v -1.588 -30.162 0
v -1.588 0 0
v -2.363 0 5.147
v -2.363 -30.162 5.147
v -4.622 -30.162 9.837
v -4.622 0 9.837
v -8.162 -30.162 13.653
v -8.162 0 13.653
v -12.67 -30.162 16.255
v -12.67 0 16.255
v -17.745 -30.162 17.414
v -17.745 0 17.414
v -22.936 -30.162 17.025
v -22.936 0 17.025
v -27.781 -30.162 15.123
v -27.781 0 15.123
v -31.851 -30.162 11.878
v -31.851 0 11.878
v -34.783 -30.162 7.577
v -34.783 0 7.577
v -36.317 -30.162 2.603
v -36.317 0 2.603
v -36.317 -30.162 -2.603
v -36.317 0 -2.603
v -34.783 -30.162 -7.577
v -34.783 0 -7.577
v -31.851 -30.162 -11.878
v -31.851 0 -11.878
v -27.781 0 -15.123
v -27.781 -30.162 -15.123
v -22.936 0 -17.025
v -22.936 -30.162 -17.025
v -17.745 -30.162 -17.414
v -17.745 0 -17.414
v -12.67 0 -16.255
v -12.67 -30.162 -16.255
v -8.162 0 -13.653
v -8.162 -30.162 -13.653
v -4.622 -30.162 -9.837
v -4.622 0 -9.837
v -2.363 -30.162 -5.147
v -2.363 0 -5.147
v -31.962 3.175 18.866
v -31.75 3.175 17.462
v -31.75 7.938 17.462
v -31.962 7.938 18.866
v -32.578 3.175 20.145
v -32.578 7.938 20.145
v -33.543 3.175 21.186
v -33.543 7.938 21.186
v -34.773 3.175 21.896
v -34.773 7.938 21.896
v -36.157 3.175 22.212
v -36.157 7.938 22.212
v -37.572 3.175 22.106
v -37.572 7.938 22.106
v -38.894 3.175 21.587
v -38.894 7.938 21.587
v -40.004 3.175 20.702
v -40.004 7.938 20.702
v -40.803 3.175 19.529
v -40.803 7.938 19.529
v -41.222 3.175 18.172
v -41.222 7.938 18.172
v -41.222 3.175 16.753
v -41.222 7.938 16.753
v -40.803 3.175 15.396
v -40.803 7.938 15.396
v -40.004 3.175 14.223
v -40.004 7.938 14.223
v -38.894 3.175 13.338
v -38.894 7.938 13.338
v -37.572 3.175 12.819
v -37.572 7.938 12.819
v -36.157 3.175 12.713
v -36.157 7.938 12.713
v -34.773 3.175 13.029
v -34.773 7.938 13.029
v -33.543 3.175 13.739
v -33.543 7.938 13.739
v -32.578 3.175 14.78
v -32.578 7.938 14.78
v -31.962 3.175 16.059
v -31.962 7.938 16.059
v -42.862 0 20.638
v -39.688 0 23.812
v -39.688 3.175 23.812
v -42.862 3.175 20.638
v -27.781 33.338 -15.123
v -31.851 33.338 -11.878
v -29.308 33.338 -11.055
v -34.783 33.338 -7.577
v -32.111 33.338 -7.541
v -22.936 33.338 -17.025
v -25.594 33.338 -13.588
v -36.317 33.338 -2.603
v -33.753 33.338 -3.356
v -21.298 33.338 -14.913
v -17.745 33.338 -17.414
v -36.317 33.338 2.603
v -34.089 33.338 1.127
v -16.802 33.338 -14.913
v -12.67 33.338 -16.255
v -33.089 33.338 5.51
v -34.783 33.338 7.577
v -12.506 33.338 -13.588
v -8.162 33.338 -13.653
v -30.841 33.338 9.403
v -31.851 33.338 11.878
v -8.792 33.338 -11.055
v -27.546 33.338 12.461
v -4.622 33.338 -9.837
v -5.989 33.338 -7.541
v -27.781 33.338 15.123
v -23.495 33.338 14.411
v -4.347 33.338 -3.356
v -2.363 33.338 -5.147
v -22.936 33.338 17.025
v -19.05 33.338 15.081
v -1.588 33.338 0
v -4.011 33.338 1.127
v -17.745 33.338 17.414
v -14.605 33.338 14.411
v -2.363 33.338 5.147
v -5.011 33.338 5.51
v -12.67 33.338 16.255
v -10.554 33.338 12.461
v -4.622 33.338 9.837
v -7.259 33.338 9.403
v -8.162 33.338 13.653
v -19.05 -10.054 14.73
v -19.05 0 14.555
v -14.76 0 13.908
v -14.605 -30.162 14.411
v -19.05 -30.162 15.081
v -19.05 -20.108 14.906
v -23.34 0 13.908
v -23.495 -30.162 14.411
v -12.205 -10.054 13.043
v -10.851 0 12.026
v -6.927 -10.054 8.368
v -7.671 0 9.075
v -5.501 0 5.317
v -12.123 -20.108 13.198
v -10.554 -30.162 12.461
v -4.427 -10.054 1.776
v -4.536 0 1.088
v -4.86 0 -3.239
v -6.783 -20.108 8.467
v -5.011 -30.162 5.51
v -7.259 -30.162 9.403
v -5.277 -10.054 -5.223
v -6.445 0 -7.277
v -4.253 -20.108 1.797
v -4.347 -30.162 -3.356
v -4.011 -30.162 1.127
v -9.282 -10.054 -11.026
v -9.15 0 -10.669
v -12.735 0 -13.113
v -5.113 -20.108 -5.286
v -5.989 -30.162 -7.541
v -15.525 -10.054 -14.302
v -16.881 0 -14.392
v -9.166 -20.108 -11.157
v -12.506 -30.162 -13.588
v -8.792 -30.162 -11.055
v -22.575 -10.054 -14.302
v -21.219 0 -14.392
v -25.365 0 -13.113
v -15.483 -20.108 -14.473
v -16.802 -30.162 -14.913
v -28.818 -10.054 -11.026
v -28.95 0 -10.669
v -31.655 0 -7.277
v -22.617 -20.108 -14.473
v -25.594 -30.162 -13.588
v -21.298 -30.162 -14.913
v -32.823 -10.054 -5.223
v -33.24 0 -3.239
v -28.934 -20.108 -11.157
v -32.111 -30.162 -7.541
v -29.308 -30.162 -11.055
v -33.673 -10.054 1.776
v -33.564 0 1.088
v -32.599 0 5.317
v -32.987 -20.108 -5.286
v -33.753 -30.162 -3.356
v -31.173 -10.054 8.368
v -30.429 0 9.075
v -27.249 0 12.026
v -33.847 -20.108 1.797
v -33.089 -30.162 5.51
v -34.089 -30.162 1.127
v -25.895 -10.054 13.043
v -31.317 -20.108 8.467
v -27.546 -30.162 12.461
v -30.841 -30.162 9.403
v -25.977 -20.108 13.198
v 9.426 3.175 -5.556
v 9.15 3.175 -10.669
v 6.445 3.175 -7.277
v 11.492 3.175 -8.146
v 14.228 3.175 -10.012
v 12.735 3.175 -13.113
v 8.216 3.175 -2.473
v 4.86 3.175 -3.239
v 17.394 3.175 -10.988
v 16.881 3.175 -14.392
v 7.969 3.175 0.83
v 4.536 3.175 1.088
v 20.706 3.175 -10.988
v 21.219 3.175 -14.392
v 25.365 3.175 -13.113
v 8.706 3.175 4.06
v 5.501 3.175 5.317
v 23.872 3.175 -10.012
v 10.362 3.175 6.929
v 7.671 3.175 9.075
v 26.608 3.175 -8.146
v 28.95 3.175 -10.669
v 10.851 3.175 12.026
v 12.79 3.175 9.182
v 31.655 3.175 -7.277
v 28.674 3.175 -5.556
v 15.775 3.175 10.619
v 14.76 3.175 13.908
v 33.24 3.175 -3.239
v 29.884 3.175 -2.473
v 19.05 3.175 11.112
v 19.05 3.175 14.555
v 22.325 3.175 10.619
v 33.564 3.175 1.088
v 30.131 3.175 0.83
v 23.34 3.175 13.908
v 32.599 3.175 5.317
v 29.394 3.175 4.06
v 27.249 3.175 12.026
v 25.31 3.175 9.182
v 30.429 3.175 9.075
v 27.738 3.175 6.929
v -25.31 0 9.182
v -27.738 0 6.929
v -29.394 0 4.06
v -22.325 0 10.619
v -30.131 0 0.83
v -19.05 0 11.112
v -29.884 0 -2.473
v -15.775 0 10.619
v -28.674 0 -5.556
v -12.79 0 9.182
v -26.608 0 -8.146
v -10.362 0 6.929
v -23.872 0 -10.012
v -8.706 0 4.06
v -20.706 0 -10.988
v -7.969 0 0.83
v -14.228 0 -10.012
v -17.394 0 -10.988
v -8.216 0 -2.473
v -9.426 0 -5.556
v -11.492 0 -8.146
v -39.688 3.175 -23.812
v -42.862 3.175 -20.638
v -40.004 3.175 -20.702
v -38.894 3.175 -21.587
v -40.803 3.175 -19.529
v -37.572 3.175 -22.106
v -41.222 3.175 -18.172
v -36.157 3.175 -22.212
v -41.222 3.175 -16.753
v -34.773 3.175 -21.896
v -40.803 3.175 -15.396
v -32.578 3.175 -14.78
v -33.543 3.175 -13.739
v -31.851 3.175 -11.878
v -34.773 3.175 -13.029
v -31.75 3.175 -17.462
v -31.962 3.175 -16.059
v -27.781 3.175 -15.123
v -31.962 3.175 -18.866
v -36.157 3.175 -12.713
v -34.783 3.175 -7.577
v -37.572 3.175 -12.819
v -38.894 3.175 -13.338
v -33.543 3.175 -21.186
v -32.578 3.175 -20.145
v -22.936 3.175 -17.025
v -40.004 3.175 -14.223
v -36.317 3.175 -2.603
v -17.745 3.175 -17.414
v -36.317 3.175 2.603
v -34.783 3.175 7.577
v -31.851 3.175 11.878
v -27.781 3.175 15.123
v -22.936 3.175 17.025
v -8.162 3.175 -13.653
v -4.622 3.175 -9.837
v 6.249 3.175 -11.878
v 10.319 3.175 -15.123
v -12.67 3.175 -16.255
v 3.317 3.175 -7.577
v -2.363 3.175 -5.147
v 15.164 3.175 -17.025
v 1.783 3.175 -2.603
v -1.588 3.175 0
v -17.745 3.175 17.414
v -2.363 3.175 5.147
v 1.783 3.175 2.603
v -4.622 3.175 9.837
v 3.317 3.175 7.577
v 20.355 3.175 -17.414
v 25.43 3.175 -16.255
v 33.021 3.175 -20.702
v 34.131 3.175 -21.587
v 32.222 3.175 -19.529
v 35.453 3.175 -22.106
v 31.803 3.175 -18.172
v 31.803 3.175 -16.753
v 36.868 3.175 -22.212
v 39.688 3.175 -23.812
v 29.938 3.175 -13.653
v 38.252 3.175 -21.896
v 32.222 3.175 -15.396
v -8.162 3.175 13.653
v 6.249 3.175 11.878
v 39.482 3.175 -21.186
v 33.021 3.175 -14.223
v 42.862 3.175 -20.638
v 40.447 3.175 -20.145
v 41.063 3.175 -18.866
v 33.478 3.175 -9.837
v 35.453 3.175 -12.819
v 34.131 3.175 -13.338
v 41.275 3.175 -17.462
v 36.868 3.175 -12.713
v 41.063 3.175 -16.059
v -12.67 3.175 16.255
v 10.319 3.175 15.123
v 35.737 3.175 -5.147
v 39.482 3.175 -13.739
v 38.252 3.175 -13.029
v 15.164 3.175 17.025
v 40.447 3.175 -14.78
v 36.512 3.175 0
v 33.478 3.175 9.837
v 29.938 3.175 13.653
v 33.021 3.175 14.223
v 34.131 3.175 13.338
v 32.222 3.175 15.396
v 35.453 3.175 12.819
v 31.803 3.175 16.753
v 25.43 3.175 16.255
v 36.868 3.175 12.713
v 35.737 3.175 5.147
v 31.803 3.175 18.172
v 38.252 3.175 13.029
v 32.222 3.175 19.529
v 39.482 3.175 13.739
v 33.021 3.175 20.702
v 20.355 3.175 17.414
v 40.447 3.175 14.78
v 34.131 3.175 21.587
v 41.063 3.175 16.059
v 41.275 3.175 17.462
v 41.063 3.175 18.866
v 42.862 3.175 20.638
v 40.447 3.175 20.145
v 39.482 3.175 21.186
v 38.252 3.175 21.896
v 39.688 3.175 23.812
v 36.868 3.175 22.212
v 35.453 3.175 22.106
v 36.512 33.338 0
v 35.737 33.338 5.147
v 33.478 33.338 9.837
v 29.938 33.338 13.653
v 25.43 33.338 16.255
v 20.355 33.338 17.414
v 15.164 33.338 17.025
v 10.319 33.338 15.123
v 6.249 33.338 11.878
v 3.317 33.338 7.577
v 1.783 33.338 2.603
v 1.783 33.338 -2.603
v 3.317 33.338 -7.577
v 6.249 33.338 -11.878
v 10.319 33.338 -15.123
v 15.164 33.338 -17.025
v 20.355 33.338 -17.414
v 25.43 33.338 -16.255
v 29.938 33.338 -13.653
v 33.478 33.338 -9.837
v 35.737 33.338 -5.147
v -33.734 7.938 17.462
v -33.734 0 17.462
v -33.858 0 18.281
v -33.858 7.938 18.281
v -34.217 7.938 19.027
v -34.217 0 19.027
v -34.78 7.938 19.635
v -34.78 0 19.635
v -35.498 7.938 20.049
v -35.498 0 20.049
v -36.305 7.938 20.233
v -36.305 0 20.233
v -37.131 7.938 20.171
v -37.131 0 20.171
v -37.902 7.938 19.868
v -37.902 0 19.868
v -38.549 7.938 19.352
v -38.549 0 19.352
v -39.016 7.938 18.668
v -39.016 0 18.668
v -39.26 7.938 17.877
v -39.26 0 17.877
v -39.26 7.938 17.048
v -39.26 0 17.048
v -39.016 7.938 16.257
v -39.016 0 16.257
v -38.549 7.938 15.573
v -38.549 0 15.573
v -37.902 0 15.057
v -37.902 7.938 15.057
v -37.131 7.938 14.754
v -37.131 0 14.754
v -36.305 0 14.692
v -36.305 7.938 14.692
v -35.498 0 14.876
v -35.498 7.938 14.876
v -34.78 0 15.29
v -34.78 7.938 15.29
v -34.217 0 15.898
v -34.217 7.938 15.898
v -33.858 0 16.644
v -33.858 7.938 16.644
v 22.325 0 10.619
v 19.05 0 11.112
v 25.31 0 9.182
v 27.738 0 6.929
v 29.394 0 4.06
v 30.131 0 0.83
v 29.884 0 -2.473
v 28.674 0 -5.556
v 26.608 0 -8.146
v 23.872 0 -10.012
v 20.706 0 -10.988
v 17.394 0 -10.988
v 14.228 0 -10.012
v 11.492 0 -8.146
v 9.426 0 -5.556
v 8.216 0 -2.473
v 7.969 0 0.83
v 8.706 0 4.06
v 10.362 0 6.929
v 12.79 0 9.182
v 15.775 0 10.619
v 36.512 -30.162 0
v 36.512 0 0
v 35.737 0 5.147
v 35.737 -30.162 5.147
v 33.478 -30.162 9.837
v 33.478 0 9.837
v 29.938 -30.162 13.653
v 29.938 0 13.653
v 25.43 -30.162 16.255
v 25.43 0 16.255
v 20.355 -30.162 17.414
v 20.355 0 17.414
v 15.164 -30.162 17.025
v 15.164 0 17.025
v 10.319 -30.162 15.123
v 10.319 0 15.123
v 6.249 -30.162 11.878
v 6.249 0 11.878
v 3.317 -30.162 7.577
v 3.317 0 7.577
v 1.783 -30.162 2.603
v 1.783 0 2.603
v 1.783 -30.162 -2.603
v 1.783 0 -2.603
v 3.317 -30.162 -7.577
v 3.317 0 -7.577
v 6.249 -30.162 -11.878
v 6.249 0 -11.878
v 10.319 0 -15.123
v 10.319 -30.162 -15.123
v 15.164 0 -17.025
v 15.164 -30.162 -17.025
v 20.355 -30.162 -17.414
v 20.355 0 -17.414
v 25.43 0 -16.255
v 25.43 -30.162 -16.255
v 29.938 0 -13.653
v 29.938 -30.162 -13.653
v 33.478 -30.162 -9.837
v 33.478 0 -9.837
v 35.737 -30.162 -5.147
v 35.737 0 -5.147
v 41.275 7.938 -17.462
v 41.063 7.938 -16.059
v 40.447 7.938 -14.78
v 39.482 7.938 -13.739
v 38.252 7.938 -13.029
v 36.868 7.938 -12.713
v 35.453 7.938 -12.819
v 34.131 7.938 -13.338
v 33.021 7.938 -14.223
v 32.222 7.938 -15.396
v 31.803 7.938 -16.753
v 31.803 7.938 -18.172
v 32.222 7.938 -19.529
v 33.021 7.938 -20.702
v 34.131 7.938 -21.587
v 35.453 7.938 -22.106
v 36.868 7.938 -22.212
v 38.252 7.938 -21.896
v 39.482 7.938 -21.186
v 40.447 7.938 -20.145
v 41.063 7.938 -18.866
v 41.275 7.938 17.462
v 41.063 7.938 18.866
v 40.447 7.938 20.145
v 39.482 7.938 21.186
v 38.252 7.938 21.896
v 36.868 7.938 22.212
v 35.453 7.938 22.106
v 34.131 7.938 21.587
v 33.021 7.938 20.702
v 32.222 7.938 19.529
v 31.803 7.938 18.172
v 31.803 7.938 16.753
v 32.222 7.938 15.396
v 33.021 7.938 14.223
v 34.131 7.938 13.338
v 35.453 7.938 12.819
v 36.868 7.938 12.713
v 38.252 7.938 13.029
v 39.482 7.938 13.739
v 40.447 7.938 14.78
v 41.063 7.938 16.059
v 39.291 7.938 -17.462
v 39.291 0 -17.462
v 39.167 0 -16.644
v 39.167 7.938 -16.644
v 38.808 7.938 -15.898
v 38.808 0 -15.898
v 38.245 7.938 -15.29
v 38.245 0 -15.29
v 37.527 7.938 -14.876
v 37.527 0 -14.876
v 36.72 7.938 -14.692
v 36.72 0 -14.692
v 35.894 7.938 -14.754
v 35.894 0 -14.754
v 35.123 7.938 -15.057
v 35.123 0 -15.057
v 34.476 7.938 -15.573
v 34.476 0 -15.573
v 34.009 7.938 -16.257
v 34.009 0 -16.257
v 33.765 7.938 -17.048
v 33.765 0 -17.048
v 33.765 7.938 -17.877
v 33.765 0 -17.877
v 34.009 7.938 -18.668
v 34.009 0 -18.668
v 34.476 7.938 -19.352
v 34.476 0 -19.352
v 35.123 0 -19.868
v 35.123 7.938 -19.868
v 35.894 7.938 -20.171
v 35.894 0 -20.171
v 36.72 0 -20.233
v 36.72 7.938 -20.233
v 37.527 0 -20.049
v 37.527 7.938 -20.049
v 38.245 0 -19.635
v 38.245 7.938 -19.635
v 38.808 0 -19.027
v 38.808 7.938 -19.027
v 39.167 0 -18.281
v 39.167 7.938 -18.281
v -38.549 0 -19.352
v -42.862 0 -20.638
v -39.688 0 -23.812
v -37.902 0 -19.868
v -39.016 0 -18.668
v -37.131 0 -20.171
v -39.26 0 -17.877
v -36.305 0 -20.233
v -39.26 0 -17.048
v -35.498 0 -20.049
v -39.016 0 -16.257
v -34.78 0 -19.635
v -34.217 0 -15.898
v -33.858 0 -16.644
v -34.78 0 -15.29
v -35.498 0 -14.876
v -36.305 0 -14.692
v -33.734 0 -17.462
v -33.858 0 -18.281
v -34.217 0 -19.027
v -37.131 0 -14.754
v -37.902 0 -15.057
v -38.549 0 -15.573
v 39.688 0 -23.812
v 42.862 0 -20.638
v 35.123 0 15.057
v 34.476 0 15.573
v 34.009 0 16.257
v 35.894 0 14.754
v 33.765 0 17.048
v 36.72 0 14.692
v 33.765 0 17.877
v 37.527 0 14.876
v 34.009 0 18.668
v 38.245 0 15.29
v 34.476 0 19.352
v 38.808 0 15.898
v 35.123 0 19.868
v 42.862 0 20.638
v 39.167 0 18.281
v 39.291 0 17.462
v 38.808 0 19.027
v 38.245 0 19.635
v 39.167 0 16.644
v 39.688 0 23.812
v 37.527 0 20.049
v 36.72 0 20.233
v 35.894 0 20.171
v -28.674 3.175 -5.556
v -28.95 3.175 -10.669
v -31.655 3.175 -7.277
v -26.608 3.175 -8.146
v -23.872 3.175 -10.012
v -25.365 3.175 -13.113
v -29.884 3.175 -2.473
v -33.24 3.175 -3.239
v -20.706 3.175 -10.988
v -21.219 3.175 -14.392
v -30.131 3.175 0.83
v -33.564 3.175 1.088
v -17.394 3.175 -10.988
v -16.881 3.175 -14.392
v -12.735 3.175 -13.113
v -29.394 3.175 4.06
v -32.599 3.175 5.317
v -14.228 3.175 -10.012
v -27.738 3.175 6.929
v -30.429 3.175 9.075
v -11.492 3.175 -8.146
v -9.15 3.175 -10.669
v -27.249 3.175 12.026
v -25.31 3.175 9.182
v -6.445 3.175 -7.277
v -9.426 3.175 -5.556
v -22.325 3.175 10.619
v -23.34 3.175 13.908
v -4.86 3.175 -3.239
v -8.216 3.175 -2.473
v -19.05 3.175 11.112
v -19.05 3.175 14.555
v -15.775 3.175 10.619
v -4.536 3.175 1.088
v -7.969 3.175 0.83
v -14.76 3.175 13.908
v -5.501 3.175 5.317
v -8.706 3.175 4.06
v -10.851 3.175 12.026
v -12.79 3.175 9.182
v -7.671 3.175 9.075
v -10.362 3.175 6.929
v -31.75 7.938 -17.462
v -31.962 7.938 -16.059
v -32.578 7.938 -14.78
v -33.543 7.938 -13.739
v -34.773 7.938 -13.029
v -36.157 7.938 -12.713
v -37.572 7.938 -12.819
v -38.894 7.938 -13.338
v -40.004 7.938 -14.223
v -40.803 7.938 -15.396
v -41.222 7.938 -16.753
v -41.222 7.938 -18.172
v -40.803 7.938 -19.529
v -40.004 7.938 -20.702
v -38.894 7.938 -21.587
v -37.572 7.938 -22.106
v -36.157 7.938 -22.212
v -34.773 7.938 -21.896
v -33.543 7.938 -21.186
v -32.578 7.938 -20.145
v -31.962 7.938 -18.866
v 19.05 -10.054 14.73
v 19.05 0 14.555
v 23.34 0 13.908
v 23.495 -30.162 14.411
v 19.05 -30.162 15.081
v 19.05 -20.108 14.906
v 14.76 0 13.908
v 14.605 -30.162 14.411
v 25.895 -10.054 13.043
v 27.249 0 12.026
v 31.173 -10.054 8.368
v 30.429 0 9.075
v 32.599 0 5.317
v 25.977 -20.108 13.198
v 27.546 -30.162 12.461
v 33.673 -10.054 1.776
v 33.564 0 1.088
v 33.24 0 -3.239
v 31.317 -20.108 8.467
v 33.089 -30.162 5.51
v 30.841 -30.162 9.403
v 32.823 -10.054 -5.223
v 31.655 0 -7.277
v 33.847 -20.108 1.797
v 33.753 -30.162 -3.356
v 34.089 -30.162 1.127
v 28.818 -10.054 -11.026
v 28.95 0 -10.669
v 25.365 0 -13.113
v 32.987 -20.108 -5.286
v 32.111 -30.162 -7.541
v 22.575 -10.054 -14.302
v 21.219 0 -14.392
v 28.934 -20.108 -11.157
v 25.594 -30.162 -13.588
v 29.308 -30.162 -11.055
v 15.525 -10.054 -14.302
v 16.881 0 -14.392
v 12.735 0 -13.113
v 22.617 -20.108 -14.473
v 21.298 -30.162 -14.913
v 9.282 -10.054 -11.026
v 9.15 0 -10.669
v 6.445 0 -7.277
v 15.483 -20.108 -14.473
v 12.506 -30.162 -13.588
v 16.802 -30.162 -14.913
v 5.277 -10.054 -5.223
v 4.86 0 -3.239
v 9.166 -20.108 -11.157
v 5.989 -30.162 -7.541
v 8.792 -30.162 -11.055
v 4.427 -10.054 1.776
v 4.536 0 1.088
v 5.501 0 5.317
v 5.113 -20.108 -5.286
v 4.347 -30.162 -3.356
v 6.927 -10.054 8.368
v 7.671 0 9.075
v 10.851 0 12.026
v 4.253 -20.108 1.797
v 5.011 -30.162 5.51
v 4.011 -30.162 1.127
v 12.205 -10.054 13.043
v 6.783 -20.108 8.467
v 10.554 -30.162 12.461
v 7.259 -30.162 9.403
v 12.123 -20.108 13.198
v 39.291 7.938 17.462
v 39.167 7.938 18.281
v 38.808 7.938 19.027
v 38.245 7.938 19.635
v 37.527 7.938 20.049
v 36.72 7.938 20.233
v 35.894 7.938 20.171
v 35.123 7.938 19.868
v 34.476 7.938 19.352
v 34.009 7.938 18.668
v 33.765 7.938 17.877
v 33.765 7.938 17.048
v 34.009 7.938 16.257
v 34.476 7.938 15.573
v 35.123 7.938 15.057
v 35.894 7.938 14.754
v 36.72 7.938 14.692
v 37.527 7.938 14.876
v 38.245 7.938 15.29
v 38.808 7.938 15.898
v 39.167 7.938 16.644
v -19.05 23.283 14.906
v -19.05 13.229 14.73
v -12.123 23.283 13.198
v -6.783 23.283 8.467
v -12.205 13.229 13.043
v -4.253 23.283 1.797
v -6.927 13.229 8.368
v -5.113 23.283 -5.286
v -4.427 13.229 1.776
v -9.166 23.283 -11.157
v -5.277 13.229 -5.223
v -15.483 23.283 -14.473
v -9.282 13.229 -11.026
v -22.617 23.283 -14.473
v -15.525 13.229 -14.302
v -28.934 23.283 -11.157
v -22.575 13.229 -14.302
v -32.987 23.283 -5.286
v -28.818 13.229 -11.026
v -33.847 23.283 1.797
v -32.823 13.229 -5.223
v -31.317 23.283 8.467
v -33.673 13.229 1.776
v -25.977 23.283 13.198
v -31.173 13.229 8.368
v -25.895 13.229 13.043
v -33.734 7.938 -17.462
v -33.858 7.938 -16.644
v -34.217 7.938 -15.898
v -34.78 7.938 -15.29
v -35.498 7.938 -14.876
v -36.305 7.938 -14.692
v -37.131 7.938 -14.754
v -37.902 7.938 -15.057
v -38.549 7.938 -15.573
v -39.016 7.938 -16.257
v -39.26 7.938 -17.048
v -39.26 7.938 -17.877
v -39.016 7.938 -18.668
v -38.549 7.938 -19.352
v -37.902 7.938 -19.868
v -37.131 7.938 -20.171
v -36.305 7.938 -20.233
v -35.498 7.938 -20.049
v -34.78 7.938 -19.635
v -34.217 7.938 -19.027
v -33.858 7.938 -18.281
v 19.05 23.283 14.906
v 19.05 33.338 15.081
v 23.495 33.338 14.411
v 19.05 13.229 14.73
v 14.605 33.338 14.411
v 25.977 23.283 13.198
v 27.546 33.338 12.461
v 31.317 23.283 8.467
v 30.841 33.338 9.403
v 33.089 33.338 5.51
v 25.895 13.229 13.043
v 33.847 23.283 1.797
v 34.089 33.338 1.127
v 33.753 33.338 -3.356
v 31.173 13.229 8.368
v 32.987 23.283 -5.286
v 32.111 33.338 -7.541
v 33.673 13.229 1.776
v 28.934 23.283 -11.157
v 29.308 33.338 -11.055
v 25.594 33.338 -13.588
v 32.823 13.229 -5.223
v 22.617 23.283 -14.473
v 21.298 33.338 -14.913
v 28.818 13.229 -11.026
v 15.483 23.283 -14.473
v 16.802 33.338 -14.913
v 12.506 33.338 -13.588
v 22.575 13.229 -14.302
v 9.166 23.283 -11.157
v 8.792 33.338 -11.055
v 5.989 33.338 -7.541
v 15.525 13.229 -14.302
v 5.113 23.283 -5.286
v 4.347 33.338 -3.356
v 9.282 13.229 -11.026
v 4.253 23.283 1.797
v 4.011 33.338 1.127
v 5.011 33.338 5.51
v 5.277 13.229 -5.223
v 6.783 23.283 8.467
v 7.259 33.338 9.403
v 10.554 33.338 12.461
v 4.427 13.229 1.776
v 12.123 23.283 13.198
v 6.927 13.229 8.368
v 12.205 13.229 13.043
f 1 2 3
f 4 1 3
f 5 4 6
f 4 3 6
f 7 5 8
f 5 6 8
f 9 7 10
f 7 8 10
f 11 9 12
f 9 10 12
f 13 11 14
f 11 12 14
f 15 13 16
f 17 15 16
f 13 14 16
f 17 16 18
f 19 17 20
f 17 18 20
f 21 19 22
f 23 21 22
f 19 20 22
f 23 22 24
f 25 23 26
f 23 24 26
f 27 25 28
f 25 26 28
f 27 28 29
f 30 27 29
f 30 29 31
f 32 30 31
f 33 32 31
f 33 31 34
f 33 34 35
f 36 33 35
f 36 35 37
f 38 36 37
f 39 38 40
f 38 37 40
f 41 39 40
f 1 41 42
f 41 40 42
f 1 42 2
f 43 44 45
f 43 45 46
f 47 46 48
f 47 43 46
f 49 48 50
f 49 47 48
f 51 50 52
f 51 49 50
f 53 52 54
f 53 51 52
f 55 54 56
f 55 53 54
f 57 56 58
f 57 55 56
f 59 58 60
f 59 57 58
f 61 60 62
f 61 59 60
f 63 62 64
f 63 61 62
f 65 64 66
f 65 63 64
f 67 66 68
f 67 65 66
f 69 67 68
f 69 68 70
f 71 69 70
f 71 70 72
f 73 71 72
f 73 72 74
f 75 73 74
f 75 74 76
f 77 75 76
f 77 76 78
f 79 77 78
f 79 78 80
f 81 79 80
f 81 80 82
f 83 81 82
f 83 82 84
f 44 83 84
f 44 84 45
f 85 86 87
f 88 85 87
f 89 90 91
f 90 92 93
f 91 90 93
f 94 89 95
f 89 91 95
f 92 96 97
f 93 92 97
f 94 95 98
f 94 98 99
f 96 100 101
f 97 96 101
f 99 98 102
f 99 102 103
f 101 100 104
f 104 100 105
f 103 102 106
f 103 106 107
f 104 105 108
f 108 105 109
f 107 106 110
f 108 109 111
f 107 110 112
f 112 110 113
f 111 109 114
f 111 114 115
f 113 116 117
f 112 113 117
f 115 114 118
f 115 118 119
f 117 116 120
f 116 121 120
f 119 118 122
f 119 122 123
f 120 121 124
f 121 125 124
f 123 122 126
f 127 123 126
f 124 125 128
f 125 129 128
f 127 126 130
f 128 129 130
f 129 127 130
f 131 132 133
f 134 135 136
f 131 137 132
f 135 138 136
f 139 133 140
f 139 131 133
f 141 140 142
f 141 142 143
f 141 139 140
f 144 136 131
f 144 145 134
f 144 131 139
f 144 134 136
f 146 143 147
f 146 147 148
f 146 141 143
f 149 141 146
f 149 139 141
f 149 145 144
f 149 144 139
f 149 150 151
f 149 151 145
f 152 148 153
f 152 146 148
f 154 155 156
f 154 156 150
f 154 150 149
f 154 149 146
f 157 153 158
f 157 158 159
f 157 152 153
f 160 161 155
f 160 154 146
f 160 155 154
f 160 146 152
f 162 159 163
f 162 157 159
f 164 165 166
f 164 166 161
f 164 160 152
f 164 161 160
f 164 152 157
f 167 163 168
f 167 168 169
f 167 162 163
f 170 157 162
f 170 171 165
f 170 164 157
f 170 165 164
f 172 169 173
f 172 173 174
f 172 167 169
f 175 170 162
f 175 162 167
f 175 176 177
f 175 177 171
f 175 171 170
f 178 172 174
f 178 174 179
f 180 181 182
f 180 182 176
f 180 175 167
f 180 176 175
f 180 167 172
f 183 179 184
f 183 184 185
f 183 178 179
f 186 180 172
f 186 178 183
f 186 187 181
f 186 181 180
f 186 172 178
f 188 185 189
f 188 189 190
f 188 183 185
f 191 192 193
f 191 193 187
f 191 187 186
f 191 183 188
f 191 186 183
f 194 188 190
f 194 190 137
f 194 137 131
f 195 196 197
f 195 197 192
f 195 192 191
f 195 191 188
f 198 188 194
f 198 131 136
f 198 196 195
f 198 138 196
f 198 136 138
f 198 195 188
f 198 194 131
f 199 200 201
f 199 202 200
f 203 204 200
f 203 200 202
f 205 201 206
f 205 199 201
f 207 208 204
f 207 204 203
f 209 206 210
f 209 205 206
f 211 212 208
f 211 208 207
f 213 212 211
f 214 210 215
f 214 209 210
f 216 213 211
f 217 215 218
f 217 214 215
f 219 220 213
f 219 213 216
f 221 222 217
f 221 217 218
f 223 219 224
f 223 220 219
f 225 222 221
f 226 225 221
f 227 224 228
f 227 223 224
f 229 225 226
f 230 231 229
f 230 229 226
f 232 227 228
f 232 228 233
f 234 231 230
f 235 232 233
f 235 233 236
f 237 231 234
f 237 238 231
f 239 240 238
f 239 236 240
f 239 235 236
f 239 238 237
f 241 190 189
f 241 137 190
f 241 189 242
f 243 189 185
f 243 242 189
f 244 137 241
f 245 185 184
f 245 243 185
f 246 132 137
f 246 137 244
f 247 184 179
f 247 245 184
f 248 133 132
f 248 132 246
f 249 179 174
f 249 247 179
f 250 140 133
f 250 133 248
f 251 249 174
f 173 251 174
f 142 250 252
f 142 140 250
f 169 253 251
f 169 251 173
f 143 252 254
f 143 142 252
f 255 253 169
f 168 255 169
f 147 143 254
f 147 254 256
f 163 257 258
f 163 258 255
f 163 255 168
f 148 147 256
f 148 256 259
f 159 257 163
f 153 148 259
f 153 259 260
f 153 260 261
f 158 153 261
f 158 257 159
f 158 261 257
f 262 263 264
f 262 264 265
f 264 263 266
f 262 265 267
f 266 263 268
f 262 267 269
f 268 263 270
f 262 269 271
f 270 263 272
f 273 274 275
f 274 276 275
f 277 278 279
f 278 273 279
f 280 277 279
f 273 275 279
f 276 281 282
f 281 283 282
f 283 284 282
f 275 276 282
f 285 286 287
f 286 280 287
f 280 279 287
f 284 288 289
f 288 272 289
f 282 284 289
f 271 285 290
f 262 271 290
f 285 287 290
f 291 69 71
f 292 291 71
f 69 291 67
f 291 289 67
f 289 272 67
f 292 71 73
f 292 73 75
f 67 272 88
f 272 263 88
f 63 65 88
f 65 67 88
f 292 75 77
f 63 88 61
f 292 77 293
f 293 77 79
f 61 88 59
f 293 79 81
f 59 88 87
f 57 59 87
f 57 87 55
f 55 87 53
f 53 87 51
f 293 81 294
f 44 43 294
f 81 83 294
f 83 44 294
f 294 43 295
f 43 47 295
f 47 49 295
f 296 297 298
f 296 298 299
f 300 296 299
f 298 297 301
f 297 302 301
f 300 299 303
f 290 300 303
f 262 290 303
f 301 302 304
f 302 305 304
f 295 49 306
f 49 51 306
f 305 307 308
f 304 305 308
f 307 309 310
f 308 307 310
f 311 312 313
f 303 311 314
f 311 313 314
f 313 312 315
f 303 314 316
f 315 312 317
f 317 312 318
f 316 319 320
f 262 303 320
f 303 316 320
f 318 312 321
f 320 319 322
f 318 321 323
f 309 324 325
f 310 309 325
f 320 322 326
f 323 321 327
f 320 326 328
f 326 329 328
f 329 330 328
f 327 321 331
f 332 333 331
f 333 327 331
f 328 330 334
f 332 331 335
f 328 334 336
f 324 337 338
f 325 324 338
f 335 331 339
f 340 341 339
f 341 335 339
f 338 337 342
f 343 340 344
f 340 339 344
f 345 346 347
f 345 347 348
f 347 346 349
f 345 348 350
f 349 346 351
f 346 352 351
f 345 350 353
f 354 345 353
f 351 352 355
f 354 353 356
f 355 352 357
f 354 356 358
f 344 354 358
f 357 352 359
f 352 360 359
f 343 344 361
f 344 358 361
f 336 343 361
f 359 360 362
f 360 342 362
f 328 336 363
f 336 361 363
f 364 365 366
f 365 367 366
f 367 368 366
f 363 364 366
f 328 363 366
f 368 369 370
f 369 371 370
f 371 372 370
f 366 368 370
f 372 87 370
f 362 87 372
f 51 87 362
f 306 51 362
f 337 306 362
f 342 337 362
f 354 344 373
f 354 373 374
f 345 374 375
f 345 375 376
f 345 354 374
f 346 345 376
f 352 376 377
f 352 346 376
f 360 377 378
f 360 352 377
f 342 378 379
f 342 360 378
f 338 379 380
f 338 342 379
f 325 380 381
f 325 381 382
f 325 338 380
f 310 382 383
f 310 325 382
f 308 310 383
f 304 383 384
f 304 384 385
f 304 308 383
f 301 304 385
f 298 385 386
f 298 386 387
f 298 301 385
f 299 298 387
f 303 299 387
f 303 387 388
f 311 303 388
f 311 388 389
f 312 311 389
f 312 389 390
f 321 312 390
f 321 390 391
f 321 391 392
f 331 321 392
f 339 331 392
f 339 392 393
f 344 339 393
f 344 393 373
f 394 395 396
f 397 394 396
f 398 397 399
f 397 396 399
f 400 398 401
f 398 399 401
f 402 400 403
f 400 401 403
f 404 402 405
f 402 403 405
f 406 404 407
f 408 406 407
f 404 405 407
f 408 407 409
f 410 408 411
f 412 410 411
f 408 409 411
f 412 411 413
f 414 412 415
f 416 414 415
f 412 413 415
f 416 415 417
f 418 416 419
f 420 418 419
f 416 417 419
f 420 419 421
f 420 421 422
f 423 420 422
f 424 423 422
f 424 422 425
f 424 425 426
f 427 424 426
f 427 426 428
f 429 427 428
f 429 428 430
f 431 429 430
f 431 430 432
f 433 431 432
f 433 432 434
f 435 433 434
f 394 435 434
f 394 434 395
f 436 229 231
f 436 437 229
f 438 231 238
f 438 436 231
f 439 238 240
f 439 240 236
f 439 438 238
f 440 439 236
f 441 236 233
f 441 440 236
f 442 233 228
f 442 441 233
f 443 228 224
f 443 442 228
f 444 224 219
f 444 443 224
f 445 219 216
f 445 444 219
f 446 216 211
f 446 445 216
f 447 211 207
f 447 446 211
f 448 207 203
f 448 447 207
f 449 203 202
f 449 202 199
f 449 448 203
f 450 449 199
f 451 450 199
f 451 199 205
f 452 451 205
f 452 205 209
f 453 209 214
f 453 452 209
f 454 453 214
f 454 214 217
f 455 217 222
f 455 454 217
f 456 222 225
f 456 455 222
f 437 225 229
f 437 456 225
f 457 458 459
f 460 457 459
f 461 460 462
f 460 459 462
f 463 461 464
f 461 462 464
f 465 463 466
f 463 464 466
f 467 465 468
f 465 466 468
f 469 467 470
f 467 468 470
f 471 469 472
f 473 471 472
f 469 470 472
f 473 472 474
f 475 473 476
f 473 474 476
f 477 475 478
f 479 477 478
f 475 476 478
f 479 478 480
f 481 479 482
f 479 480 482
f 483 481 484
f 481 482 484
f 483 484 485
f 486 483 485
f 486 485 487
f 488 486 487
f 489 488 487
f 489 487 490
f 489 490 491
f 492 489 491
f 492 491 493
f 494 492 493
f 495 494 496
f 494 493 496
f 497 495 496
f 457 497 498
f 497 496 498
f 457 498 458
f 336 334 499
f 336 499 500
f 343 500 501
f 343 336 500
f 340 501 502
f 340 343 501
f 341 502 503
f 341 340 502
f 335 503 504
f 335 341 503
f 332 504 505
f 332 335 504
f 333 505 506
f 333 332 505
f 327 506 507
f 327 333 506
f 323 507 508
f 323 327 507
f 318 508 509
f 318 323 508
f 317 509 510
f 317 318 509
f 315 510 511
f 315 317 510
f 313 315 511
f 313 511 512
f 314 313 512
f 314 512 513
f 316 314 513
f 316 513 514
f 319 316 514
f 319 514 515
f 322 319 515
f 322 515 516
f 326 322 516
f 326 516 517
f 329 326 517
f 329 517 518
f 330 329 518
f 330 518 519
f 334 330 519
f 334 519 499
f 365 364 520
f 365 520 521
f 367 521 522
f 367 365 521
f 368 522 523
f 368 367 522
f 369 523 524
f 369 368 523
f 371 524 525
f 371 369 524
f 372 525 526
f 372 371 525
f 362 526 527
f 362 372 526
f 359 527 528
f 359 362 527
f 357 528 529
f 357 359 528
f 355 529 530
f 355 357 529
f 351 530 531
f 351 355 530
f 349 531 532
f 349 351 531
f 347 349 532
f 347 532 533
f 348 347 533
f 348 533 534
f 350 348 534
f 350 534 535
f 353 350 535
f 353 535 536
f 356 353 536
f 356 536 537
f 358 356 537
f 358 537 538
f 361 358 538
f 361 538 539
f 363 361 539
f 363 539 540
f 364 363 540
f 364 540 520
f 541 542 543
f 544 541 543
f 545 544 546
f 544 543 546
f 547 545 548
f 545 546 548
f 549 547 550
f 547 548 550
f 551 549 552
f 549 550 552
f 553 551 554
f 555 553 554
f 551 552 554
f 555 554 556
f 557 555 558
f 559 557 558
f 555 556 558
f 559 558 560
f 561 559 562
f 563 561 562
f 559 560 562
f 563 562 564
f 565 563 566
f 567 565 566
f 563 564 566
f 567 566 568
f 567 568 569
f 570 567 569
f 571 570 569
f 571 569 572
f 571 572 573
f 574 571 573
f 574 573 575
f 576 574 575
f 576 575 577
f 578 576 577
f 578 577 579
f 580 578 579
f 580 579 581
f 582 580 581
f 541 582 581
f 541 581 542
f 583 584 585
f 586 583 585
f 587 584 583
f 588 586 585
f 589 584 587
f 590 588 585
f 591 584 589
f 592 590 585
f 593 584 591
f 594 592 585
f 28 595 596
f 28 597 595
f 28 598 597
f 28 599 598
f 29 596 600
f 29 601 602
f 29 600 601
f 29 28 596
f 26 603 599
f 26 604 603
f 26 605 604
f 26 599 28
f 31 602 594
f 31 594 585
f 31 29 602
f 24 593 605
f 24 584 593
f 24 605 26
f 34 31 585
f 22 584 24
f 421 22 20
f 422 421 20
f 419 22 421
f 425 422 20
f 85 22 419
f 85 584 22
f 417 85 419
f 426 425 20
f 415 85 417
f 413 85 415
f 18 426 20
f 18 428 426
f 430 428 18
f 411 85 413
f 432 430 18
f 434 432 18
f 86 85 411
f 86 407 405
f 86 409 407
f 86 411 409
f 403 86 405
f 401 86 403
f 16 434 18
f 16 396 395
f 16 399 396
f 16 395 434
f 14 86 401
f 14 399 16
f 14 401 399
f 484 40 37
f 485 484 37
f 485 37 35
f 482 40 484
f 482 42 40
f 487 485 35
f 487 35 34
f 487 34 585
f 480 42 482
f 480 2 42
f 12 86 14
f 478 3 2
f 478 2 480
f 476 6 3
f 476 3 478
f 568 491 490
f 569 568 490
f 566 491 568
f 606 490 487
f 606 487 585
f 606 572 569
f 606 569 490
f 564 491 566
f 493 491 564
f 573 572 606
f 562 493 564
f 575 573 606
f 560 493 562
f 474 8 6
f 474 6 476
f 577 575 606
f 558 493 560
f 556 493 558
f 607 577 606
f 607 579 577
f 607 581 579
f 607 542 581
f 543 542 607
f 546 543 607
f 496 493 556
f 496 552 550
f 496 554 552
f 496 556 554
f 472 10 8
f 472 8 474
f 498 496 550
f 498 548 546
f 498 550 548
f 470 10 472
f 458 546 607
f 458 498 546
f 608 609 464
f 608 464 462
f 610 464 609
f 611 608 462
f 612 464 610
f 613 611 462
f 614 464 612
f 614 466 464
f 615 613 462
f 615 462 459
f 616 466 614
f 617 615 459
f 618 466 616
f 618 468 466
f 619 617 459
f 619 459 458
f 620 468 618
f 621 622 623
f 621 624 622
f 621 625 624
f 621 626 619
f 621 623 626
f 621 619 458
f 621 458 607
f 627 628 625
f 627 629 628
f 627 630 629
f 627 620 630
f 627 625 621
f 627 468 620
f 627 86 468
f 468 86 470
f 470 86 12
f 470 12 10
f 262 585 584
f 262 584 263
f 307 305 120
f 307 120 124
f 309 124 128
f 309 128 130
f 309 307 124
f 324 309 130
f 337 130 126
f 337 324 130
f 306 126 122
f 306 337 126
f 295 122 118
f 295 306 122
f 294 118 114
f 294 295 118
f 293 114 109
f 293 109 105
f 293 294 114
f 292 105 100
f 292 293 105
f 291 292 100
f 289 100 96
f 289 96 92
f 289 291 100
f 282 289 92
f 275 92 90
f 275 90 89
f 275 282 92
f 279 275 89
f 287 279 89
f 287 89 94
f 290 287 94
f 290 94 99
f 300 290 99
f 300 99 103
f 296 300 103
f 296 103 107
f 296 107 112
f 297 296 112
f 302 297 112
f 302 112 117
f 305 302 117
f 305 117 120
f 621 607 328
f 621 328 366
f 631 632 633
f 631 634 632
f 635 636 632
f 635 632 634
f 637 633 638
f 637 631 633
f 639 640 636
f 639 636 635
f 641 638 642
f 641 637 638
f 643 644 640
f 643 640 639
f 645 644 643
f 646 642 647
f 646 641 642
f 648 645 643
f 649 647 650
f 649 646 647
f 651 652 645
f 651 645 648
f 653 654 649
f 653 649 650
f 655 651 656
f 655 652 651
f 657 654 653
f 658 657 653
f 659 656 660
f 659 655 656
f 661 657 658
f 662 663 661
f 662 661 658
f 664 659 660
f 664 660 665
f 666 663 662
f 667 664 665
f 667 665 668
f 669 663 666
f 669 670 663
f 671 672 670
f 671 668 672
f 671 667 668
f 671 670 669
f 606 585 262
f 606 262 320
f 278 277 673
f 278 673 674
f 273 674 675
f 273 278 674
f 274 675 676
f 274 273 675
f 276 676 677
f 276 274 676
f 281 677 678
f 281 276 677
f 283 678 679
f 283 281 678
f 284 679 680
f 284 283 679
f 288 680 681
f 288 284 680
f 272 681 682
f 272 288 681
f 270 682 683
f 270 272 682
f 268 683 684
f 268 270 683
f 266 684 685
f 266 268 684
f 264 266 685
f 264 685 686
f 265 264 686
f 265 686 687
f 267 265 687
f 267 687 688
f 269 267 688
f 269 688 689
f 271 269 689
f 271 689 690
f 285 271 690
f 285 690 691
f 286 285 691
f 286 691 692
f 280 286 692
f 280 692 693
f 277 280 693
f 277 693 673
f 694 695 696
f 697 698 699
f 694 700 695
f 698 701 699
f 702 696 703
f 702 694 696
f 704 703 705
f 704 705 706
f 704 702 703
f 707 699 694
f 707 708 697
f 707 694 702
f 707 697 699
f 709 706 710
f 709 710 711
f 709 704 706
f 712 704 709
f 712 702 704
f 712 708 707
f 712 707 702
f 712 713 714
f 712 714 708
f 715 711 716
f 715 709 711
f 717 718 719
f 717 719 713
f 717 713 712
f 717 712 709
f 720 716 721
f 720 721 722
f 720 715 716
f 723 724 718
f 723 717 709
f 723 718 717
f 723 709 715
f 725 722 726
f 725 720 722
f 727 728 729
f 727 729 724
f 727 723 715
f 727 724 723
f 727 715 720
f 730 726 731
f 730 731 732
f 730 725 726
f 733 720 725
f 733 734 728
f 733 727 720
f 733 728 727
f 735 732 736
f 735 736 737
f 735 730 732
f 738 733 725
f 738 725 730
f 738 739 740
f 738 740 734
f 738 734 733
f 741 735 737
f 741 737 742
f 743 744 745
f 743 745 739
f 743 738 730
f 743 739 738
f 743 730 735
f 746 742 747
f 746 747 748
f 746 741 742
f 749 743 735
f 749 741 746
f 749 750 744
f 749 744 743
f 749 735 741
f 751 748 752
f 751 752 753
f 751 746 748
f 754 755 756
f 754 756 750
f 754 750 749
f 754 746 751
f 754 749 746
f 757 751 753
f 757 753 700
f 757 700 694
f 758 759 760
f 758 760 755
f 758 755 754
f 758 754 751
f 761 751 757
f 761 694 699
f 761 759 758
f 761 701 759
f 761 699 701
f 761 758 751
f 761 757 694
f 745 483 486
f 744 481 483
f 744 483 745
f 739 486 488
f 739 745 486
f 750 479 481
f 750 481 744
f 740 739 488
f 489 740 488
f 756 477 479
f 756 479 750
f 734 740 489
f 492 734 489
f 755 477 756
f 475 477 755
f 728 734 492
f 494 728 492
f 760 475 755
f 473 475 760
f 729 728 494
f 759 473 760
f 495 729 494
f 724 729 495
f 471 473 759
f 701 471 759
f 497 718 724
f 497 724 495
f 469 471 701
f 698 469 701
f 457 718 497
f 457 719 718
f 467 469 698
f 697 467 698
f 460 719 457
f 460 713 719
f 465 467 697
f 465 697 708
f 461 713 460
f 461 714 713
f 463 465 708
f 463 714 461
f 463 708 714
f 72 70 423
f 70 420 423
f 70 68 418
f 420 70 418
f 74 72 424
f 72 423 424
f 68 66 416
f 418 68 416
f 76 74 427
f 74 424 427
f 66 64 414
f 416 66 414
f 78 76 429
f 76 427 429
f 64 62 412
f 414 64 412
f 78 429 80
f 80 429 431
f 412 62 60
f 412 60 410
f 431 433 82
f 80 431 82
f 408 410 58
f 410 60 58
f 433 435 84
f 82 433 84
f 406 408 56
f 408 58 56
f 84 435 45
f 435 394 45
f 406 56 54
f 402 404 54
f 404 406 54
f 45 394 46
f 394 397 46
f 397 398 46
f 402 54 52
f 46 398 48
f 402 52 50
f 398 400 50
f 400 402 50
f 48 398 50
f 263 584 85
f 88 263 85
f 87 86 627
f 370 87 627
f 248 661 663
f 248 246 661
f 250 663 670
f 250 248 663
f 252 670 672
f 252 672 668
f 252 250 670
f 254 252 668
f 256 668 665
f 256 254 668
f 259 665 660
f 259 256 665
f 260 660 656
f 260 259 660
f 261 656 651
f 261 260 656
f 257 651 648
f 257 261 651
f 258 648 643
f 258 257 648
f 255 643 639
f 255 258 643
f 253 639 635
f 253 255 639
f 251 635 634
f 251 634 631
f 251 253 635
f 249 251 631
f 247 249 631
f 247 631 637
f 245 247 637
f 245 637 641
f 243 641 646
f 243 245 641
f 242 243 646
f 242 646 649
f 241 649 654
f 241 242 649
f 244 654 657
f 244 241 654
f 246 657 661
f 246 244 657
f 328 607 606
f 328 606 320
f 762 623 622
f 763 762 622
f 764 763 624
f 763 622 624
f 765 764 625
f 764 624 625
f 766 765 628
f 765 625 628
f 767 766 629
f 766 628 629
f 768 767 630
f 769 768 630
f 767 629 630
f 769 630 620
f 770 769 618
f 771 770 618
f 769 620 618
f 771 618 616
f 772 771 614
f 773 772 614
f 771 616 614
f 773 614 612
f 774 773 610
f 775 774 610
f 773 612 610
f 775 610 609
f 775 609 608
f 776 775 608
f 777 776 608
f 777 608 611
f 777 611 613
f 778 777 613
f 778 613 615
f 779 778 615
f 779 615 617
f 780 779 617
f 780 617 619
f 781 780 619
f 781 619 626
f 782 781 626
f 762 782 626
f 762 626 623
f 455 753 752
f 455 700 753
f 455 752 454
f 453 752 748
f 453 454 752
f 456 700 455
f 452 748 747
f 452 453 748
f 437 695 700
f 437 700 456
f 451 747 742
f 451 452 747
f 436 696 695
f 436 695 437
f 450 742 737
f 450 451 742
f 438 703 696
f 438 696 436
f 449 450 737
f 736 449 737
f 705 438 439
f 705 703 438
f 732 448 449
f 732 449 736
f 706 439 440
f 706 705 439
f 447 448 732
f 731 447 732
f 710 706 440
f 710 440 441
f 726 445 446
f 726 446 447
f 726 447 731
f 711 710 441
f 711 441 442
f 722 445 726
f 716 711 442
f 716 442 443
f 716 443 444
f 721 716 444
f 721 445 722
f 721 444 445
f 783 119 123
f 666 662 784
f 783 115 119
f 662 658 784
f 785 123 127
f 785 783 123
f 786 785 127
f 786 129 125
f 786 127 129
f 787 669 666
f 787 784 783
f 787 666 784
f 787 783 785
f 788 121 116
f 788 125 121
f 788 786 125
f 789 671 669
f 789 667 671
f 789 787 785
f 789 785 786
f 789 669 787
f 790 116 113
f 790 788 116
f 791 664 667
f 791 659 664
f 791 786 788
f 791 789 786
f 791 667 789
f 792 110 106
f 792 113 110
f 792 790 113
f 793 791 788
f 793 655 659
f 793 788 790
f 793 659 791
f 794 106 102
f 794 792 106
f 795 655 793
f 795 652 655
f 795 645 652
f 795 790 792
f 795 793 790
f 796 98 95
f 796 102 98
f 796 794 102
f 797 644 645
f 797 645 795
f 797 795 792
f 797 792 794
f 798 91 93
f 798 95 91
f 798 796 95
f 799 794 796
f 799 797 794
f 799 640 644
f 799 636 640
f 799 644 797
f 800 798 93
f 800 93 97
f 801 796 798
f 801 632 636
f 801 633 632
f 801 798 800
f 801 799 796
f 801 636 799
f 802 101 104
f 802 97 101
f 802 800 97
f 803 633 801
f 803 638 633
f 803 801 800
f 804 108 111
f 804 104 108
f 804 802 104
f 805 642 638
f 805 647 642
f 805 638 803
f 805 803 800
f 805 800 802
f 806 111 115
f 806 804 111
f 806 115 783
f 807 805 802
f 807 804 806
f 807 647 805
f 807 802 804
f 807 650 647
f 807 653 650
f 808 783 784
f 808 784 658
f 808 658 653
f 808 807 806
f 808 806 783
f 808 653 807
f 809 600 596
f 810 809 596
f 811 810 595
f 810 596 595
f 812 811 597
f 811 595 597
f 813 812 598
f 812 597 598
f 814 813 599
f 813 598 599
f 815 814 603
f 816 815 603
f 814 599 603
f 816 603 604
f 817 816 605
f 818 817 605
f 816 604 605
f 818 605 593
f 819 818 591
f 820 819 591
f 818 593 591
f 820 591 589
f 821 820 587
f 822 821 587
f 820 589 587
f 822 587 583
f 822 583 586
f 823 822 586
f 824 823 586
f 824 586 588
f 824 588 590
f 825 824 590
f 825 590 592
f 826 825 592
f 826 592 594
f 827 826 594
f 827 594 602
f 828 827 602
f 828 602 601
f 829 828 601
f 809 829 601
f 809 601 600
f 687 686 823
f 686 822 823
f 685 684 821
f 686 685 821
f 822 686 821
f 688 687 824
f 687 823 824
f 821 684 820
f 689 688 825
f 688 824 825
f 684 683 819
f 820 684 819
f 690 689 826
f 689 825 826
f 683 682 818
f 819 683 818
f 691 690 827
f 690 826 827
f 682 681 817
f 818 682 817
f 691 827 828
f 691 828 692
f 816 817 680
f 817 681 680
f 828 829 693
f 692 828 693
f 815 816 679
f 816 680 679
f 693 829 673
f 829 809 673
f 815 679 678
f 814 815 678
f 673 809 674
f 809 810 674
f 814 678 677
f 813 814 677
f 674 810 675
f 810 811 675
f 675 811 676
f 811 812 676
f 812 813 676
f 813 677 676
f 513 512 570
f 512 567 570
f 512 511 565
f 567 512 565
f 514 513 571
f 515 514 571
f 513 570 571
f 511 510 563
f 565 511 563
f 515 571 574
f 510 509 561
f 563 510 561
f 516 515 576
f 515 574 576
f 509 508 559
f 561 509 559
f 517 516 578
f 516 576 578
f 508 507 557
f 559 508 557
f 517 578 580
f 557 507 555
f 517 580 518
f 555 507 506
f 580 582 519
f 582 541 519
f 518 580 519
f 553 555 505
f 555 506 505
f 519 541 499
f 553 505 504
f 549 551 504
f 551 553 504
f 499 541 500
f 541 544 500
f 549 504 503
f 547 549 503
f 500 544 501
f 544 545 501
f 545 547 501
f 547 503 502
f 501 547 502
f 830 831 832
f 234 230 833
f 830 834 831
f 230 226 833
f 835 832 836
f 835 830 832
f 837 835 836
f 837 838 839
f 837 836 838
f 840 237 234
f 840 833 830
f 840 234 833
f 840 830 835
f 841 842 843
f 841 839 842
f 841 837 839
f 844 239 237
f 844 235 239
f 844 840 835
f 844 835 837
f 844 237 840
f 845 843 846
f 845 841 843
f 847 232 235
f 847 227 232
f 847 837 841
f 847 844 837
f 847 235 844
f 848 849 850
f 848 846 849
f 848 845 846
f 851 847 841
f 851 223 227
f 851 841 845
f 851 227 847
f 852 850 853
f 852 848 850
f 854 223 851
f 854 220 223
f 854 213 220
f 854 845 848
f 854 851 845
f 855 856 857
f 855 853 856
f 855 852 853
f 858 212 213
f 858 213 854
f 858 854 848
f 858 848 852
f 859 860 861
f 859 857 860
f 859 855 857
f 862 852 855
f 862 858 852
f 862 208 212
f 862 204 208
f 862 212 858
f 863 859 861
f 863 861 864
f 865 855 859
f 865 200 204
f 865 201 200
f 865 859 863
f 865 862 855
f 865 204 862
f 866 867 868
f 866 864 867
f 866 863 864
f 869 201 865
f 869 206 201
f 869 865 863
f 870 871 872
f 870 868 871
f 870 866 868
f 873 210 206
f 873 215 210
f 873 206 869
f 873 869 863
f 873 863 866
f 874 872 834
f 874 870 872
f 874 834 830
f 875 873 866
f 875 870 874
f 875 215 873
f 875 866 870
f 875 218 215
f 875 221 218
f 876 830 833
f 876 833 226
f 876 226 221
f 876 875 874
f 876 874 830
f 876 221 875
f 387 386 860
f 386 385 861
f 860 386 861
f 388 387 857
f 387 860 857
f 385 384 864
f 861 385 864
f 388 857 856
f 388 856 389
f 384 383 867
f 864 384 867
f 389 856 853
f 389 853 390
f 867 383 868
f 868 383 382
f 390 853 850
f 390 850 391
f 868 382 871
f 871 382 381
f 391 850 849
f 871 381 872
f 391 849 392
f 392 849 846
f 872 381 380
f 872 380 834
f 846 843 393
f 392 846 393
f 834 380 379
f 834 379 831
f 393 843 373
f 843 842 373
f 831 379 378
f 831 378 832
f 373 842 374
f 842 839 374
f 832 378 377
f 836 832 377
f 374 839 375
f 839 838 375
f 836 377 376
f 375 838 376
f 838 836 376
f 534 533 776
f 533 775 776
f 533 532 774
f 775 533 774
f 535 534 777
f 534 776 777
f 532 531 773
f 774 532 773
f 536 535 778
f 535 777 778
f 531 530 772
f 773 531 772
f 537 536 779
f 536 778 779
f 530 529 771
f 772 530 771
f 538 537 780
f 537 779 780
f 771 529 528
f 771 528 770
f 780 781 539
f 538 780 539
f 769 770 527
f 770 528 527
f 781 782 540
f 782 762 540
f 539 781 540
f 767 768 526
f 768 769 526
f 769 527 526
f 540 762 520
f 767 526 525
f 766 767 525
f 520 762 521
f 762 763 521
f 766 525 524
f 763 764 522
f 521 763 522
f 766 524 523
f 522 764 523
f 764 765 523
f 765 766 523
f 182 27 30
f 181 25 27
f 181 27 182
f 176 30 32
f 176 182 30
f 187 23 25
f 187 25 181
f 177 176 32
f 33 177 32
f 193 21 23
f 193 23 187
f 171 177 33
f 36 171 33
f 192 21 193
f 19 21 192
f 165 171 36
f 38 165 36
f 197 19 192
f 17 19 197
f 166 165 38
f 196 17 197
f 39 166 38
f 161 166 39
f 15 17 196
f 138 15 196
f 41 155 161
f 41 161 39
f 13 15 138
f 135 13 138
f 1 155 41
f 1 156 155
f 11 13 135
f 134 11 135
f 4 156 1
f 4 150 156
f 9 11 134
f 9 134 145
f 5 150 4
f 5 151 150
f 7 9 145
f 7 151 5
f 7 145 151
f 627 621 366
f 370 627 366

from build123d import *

# Parameters (mm, degrees)
F4_W      = 85.725
F4_H      = 47.625
F5_DEPTH  = 3.175
F6_R      = 17.4625
F7_DEPTH  = 30.1625
F8_R      = 17.4625
F9_DEPTH  = 33.3375
F14_SIZE  = 3.175
F15_R     = 4.7625
F16_DEPTH = 7.9375
F17_R     = 2.778125
F18_DEPTH = 25.4


with BuildPart() as f5:
    # F4 (on Front) → F5 (new body, through all)
    with BuildSketch(Plane.XZ):
        Rectangle(F4_W, F4_H)
    extrude(amount=-F5_DEPTH)

    # F6 (on Front) → F7 (join, through all)
    with BuildSketch(Plane.XZ):
        with Locations((19.05, 0)):
            Circle(F6_R)
        with Locations((-19.05, 0)):
            Circle(F6_R)
    extrude(amount=F7_DEPTH)

    # F8 (on Front) → F9 (join, through all)
    with BuildSketch(Plane.XZ):
        with Locations((19.05, 0)):
            Circle(F8_R)
        with Locations((-19.05, 0)):
            Circle(F8_R)
    extrude(amount=-F9_DEPTH)

    # F10 (on plane+point) → F12 (revolve, cut)
    with BuildSketch(Plane.YZ.offset(-19.05)):
        Polygon((0, 14.554762), (-37.202075, 15.204126), (-37.202075, 0), (35.393614, 0), (35.393614, 15.11714), (3.175, 14.554762), (3.175, 11.1125), (0, 11.1125), align=None)
    revolve(axis=Axis((-19.05, -0.90423, 0), (0, 1, 0)), mode=Mode.SUBTRACT)

    # F11 (on plane+point) → F13 (revolve, cut)
    with BuildSketch(Plane.YZ.offset(19.05)):
        Polygon((0, 14.554762), (-37.202075, 15.204126), (-37.202075, 0), (35.393614, 0), (35.393614, 15.11714), (3.175, 14.554762), (3.175, 11.1125), (0, 11.1125), align=None)
    revolve(axis=Axis((19.05, -0.90423, 0), (0, 1, 0)), mode=Mode.SUBTRACT)

    # F14
    f14_edges = [f5.edges().sort_by_distance(p)[0] for p in [
        (-42.8625, 1.5875, 23.8125),
        (42.8625, 1.5875, 23.8125),
        (42.8625, 1.5875, -23.8125),
        (-42.8625, 1.5875, -23.8125),
    ]]
    chamfer(f14_edges, length=F14_SIZE)

    # F15 (on Front) → F16 (join)
    with BuildSketch(Plane.XZ):
        with Locations((36.5125, 17.4625)):
            Circle(F15_R)
        with Locations((-36.5125, 17.4625)):
            Circle(F15_R)
        with Locations((-36.5125, -17.4625)):
            Circle(F15_R)
        with Locations((36.5125, -17.4625)):
            Circle(F15_R)
    extrude(amount=-F16_DEPTH)

    # F17 (on Front) → F18 (cut)
    with BuildSketch(Plane.XZ):
        with Locations((-36.5125, 17.4625)):
            Circle(F17_R)
        with Locations((36.5125, 17.4625)):
            Circle(F17_R)
        with Locations((-36.5125, -17.4625)):
            Circle(F17_R)
        with Locations((36.5125, -17.4625)):
            Circle(F17_R)
    extrude(amount=-F18_DEPTH, mode=Mode.SUBTRACT)


solid = f5.part
